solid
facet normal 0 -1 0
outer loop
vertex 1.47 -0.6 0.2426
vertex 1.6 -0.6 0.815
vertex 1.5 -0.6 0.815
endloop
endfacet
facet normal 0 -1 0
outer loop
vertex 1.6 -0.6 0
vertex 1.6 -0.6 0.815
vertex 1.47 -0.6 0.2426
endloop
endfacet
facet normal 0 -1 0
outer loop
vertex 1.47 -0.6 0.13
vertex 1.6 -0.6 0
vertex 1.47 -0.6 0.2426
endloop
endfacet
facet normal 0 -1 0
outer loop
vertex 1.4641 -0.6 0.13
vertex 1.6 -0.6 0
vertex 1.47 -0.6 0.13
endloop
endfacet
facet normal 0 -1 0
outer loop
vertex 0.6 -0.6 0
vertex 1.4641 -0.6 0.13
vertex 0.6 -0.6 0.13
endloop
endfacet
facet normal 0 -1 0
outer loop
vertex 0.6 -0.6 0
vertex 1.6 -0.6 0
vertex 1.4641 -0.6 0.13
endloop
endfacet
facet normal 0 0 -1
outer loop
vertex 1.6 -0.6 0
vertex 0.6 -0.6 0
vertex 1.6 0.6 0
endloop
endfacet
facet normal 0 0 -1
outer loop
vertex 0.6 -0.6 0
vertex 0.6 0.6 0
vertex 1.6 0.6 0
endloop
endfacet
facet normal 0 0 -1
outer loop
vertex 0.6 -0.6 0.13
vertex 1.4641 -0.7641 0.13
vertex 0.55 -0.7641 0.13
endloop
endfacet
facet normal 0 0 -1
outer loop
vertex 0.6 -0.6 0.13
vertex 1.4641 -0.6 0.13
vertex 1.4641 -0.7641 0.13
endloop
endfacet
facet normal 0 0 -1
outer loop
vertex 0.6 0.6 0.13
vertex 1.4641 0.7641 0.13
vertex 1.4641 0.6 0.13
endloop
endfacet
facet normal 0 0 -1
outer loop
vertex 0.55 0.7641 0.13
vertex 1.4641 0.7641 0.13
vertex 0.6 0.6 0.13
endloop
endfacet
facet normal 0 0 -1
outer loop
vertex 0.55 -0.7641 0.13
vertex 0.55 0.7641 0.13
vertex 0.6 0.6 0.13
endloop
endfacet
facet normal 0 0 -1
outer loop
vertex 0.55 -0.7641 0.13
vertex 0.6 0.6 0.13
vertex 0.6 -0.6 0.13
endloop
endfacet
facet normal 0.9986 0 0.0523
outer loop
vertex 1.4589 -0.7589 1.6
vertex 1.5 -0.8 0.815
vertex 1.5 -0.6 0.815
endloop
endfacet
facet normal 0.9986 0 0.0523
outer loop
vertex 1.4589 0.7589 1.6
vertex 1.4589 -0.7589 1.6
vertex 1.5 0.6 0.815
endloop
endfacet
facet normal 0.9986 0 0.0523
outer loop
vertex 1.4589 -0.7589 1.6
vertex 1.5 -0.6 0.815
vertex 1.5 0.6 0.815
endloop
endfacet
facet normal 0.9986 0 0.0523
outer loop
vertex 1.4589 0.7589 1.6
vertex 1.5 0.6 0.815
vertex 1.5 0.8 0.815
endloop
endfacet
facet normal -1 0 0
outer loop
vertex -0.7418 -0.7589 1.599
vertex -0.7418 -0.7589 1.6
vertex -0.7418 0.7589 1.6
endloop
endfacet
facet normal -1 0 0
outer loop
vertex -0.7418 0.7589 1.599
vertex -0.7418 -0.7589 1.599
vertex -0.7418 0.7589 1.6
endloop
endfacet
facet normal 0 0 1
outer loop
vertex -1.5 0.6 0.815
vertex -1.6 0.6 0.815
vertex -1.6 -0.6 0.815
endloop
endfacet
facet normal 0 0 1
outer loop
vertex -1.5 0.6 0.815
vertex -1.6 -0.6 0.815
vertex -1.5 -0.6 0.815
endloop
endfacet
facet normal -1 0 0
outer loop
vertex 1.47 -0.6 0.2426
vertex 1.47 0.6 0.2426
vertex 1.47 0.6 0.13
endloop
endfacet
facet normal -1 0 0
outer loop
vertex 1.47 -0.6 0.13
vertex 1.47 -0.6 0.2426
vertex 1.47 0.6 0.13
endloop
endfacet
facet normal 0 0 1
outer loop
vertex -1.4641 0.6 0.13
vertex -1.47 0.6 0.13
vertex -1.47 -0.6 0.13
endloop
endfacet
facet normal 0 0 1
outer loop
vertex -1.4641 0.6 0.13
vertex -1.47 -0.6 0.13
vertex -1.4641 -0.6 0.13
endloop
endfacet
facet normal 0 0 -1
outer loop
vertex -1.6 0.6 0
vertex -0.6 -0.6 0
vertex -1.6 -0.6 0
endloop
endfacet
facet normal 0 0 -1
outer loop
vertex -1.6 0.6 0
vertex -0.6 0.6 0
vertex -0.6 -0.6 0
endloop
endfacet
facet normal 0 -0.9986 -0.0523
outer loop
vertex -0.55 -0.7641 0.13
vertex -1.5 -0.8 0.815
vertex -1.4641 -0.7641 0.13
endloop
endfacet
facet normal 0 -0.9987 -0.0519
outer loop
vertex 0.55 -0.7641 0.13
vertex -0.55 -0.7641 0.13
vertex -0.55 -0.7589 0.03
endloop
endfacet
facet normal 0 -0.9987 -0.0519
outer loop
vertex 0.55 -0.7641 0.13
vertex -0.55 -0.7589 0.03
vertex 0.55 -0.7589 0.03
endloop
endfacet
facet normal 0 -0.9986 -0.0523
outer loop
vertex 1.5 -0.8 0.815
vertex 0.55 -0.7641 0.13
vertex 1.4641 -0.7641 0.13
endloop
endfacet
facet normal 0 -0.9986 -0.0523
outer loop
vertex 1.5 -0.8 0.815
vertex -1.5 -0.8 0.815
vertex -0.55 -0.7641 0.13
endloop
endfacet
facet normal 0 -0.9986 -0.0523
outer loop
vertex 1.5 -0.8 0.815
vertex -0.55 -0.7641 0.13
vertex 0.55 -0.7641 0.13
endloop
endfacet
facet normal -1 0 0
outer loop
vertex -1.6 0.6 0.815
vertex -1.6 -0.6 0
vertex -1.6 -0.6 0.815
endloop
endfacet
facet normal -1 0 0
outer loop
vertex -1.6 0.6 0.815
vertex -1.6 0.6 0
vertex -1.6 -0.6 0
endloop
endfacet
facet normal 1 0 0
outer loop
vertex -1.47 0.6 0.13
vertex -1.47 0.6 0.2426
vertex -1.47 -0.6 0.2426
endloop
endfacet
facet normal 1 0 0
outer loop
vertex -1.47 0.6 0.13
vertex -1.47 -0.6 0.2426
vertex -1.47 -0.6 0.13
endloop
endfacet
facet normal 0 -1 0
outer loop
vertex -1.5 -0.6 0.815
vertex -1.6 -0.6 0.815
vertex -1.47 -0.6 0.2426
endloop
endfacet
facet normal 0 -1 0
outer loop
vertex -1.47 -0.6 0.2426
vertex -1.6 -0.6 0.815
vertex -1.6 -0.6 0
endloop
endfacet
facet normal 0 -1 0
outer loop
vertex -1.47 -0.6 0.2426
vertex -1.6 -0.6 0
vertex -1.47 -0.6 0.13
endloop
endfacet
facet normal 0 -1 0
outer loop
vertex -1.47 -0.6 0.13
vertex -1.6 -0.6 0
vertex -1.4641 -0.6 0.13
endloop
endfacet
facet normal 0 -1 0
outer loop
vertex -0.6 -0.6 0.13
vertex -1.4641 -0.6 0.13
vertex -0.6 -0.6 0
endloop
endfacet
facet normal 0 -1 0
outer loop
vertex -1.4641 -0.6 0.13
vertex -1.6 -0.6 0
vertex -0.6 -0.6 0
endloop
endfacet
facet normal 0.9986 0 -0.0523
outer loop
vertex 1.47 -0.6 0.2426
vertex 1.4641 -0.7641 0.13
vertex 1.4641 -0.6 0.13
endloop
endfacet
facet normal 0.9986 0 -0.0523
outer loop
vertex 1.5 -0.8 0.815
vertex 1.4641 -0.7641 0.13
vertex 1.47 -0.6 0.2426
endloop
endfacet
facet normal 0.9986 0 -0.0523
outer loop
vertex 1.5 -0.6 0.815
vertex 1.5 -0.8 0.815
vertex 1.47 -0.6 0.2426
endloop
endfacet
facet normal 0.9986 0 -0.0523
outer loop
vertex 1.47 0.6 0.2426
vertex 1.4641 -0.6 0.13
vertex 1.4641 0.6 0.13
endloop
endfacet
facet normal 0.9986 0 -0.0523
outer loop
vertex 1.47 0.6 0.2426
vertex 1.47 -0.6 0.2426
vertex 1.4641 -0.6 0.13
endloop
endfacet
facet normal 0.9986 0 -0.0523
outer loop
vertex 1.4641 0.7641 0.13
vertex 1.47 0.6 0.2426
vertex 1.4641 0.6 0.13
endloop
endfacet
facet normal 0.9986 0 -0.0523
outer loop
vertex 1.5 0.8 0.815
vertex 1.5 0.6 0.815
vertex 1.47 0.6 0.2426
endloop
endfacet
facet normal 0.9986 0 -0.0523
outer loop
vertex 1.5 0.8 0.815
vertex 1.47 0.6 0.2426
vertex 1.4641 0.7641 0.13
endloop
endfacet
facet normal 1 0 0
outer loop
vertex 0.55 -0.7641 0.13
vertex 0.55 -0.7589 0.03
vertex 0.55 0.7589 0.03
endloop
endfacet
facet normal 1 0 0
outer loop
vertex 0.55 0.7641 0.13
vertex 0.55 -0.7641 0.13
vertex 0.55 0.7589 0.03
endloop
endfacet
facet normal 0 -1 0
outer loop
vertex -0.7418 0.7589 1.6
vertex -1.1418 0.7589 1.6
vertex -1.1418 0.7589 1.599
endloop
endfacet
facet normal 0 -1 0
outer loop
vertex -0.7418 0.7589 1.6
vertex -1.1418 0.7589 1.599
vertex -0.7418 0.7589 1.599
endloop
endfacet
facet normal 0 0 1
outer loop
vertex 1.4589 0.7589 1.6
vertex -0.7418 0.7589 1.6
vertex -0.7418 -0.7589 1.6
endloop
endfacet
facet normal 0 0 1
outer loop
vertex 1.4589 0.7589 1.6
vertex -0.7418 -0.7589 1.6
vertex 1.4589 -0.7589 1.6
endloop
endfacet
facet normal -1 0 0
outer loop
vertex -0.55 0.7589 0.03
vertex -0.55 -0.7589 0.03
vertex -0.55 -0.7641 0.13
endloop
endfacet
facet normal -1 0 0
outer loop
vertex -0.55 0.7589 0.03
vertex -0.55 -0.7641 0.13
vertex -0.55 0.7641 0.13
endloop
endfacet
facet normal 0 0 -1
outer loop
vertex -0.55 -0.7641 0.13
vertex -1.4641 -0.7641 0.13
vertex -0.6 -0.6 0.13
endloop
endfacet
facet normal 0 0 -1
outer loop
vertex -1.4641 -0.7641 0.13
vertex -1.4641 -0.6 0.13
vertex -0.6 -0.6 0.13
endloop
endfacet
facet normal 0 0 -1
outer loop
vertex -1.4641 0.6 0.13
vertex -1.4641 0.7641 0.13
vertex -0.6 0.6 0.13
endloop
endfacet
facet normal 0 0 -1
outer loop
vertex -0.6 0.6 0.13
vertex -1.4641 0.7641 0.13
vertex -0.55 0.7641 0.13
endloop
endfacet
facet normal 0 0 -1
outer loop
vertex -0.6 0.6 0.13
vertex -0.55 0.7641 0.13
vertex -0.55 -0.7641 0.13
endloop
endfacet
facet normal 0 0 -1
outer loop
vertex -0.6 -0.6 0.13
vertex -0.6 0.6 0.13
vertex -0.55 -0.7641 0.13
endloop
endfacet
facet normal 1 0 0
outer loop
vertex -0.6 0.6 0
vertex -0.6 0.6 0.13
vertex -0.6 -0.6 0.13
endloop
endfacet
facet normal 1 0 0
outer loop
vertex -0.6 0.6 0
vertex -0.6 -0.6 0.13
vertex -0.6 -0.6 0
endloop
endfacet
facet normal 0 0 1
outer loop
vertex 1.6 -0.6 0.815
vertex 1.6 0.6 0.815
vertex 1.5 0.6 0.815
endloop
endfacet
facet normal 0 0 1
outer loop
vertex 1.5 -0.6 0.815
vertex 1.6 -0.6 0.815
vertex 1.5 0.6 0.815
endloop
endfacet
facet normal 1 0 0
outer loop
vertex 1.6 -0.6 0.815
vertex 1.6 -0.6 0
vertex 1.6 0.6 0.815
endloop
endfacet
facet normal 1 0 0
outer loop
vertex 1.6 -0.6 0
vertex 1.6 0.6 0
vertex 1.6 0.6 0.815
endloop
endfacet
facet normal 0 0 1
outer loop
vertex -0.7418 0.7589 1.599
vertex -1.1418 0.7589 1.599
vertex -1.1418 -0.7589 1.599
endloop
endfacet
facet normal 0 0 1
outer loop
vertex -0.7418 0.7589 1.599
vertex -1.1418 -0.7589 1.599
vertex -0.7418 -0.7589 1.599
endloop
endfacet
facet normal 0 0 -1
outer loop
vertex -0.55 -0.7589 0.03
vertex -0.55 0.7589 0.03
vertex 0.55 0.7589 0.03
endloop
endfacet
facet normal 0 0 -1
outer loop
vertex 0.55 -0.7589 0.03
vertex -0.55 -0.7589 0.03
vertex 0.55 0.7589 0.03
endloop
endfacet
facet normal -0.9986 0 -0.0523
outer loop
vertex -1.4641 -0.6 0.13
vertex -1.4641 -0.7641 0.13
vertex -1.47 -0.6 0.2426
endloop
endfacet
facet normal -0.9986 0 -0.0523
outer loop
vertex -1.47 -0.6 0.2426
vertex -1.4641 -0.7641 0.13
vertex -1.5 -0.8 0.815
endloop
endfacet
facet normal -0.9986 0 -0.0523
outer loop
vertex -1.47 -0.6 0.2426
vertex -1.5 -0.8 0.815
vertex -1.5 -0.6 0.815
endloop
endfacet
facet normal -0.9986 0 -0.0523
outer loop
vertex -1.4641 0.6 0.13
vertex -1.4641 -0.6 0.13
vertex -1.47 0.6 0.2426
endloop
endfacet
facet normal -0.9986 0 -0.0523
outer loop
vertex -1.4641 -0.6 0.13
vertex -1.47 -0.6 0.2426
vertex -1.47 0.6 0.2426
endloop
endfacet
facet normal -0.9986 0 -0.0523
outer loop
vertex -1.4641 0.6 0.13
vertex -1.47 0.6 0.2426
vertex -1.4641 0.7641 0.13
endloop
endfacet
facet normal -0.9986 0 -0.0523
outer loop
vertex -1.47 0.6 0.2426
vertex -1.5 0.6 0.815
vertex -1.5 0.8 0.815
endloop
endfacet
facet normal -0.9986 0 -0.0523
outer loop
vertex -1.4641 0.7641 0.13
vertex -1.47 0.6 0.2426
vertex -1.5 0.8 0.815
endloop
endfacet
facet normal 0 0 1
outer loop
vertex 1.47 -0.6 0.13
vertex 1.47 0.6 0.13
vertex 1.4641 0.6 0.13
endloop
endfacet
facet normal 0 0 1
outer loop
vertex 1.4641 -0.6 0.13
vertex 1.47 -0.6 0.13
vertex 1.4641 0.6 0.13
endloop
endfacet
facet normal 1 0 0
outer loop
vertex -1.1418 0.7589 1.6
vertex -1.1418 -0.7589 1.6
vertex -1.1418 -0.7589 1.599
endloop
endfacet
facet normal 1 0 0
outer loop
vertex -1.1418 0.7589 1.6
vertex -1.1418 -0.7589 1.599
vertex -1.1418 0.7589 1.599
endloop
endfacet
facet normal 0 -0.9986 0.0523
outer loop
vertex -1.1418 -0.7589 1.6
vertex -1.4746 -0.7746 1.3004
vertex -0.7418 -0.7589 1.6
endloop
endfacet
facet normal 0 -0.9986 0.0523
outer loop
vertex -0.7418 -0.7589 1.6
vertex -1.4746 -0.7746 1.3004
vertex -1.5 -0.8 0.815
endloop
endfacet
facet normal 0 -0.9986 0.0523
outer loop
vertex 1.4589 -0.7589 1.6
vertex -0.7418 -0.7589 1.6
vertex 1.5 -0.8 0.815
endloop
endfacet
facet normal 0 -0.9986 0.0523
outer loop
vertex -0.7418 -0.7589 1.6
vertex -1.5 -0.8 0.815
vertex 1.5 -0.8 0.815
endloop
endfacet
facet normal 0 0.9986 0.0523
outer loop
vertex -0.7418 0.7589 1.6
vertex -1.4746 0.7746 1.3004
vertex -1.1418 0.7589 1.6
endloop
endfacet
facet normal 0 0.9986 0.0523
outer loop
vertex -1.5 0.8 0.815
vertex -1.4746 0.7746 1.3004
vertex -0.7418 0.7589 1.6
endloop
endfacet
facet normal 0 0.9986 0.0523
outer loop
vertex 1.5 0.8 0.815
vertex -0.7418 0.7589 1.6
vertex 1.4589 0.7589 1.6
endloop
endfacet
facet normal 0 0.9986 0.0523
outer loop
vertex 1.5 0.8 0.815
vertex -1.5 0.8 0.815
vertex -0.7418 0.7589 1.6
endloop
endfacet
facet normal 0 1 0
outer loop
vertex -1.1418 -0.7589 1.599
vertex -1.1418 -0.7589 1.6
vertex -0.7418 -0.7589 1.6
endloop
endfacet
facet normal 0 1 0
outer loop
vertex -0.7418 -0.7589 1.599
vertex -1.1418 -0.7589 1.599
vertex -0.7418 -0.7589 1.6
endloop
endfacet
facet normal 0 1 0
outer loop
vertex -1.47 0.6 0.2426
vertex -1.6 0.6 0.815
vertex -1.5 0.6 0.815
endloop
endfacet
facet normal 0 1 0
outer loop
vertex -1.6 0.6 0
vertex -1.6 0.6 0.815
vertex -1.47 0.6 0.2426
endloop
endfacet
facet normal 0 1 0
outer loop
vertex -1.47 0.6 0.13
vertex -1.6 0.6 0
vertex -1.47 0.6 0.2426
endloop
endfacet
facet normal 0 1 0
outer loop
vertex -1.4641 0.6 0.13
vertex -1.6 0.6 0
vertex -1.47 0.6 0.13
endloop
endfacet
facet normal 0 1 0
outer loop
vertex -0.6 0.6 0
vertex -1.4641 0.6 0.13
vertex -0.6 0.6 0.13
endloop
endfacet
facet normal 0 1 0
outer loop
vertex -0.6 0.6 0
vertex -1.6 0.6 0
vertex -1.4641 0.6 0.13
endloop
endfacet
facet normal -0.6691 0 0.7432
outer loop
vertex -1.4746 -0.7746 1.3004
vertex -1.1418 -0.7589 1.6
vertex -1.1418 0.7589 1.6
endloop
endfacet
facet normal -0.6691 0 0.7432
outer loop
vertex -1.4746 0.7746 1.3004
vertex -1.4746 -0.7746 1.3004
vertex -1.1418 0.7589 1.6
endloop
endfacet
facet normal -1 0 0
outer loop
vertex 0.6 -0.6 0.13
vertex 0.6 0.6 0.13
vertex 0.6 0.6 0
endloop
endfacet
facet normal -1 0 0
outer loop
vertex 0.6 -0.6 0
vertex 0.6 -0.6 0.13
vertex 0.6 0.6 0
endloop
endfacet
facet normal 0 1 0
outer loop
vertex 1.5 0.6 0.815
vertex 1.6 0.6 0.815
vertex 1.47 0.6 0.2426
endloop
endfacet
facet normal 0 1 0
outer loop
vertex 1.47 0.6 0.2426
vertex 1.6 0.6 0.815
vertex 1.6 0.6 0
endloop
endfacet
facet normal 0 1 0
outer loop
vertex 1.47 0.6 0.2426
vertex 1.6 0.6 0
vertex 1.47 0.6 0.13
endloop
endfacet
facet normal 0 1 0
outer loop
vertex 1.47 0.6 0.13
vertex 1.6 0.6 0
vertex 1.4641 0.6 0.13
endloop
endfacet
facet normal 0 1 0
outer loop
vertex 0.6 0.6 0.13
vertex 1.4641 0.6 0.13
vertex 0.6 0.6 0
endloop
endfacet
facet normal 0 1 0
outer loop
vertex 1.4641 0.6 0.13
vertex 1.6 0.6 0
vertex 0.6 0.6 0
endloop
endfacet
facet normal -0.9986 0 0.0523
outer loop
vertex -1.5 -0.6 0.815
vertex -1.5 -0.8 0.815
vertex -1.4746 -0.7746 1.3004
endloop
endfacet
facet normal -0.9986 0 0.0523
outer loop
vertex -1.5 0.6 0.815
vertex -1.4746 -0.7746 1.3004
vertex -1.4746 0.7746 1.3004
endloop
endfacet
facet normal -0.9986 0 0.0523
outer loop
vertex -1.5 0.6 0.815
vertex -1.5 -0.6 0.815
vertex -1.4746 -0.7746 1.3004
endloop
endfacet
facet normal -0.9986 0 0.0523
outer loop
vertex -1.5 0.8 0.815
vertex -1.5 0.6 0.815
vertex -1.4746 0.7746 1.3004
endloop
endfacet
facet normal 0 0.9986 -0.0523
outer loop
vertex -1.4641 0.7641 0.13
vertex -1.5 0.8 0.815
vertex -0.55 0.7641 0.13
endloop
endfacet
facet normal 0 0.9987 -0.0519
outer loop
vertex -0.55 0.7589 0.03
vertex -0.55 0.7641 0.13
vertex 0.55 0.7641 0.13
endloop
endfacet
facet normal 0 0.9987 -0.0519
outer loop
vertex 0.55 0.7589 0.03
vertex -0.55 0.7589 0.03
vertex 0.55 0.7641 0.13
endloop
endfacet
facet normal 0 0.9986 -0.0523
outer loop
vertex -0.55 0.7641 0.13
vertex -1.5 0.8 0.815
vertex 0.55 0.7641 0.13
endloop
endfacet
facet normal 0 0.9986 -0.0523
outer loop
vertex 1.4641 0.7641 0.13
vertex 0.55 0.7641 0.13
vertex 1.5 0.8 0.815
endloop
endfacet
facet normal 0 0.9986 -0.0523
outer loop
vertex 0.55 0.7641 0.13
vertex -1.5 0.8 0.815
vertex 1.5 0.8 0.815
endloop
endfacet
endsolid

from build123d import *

# Parameters (mm, degrees)
SKETCH1_W                 = 3
SKETCH1_H                 = 1.6
BOSS_EXTRUDE1_DEPTH       = 0.785
DRAFT2_ANGLE              = 3
DRAFT2_OF_MIRROR2_2_ANGLE = 3
CHAMFER1_SIZE             = 0.3
CHAMFER1_SIZE2            = 0.317026351
SKETCH2_W                 = 1.350619213
SKETCH2_H                 = 1.724924769
CUT_EXTRUDE1_DEPTH        = 0.1
BOSS_EXTRUDE3_DEPTH       = 0.6
SKETCH4_W                 = 0.4
SKETCH4_H                 = 1.517719786
CUT_EXTRUDE2_DEPTH        = 0.001


with BuildPart() as part:
    # Sketch1 → Boss-Extrude1 (new body)
    with BuildSketch(Plane.XY.offset(0.815)):
        Rectangle(SKETCH1_W, SKETCH1_H)
    boss_extrude1 = extrude(amount=BOSS_EXTRUDE1_DEPTH)

    # Draft2
    draft2_faces = [part.faces().sort_by_distance(p)[0] for p in [
        (-1.5, 0, 1.2075),
        (0, 0.8, 1.2075),
        (1.5, 0, 1.2075),
        (0, -0.8, 1.2075),
    ]]
    draft(draft2_faces, Plane.XY.offset(0.815), DRAFT2_ANGLE)

    # Mirror2: Boss-Extrude1 across plane
    add(boss_extrude1.mirror(Plane.XY.offset(0.815)))

    # Draft2 of Mirror2 2
    draft2_of_mirror2_2_faces = [part.faces().sort_by_distance(p)[0] for p in [
        (-1.5, 0, 0.4225),
        (0, 0.8, 0.4225),
        (1.5, 0, 0.4225),
        (0, -0.8, 0.4225),
    ]]
    draft(draft2_of_mirror2_2_faces, Plane(origin=(0, 0, 0.815), x_dir=(1, 0, 0), z_dir=(0, 0, -1)), DRAFT2_OF_MIRROR2_2_ANGLE)

    # Chamfer1
    chamfer1_edges = [part.edges().sort_by_distance(p)[0] for p in [
        (-1.458859893, 0, 1.6),
    ]]
    chamfer1_side = [part.faces().sort_by_distance(p)[0] for p in [
        (-1.479610902, 0, 1.204047158),
    ]]
    chamfer(chamfer1_edges, length=CHAMFER1_SIZE, length2=CHAMFER1_SIZE2, reference=chamfer1_side[0])

    # Sketch2 → Cut-Extrude1 (cut)
    with BuildSketch(Plane(origin=(0, 0, 0.03), x_dir=(-1, 0, 0), z_dir=(0, 0, -1))):
        with Locations((-1.225309607, -0.028072916)):
            Rectangle(SKETCH2_W, SKETCH2_H)
    cut_extrude1 = extrude(amount=-CUT_EXTRUDE1_DEPTH, mode=Mode.SUBTRACT)

    # Mirror3: Cut-Extrude1 across plane
    add(cut_extrude1.mirror(Plane(origin=(0, 0, 0), x_dir=(0, 0, 1), z_dir=(1, 0, 0))), mode=Mode.SUBTRACT)

    # Sketch3 → Boss-Extrude3 (add, symmetric)
    with BuildSketch(Plane(origin=(0, 0, 0), x_dir=(1, 0, 0), z_dir=(0, 1, 0))):
        Polygon((0.6, -0.13), (0.6, 0), (1.6, 0), (1.6, -0.815), (1.47, -0.815), (1.47, -0.13), align=None)
    boss_extrude3 = extrude(amount=BOSS_EXTRUDE3_DEPTH, both=True)

    # Mirror4: Boss-Extrude3 across plane
    add(boss_extrude3.mirror(Plane(origin=(0, 0, 0), x_dir=(0, 0, 1), z_dir=(1, 0, 0))))

    # Sketch4 → Cut-Extrude2 (cut)
    with BuildSketch(Plane.XY.offset(1.6)):
        with Locations((-0.941833542, 0)):
            Rectangle(SKETCH4_W, SKETCH4_H)
    extrude(amount=-CUT_EXTRUDE2_DEPTH, mode=Mode.SUBTRACT)


solid = part.part
